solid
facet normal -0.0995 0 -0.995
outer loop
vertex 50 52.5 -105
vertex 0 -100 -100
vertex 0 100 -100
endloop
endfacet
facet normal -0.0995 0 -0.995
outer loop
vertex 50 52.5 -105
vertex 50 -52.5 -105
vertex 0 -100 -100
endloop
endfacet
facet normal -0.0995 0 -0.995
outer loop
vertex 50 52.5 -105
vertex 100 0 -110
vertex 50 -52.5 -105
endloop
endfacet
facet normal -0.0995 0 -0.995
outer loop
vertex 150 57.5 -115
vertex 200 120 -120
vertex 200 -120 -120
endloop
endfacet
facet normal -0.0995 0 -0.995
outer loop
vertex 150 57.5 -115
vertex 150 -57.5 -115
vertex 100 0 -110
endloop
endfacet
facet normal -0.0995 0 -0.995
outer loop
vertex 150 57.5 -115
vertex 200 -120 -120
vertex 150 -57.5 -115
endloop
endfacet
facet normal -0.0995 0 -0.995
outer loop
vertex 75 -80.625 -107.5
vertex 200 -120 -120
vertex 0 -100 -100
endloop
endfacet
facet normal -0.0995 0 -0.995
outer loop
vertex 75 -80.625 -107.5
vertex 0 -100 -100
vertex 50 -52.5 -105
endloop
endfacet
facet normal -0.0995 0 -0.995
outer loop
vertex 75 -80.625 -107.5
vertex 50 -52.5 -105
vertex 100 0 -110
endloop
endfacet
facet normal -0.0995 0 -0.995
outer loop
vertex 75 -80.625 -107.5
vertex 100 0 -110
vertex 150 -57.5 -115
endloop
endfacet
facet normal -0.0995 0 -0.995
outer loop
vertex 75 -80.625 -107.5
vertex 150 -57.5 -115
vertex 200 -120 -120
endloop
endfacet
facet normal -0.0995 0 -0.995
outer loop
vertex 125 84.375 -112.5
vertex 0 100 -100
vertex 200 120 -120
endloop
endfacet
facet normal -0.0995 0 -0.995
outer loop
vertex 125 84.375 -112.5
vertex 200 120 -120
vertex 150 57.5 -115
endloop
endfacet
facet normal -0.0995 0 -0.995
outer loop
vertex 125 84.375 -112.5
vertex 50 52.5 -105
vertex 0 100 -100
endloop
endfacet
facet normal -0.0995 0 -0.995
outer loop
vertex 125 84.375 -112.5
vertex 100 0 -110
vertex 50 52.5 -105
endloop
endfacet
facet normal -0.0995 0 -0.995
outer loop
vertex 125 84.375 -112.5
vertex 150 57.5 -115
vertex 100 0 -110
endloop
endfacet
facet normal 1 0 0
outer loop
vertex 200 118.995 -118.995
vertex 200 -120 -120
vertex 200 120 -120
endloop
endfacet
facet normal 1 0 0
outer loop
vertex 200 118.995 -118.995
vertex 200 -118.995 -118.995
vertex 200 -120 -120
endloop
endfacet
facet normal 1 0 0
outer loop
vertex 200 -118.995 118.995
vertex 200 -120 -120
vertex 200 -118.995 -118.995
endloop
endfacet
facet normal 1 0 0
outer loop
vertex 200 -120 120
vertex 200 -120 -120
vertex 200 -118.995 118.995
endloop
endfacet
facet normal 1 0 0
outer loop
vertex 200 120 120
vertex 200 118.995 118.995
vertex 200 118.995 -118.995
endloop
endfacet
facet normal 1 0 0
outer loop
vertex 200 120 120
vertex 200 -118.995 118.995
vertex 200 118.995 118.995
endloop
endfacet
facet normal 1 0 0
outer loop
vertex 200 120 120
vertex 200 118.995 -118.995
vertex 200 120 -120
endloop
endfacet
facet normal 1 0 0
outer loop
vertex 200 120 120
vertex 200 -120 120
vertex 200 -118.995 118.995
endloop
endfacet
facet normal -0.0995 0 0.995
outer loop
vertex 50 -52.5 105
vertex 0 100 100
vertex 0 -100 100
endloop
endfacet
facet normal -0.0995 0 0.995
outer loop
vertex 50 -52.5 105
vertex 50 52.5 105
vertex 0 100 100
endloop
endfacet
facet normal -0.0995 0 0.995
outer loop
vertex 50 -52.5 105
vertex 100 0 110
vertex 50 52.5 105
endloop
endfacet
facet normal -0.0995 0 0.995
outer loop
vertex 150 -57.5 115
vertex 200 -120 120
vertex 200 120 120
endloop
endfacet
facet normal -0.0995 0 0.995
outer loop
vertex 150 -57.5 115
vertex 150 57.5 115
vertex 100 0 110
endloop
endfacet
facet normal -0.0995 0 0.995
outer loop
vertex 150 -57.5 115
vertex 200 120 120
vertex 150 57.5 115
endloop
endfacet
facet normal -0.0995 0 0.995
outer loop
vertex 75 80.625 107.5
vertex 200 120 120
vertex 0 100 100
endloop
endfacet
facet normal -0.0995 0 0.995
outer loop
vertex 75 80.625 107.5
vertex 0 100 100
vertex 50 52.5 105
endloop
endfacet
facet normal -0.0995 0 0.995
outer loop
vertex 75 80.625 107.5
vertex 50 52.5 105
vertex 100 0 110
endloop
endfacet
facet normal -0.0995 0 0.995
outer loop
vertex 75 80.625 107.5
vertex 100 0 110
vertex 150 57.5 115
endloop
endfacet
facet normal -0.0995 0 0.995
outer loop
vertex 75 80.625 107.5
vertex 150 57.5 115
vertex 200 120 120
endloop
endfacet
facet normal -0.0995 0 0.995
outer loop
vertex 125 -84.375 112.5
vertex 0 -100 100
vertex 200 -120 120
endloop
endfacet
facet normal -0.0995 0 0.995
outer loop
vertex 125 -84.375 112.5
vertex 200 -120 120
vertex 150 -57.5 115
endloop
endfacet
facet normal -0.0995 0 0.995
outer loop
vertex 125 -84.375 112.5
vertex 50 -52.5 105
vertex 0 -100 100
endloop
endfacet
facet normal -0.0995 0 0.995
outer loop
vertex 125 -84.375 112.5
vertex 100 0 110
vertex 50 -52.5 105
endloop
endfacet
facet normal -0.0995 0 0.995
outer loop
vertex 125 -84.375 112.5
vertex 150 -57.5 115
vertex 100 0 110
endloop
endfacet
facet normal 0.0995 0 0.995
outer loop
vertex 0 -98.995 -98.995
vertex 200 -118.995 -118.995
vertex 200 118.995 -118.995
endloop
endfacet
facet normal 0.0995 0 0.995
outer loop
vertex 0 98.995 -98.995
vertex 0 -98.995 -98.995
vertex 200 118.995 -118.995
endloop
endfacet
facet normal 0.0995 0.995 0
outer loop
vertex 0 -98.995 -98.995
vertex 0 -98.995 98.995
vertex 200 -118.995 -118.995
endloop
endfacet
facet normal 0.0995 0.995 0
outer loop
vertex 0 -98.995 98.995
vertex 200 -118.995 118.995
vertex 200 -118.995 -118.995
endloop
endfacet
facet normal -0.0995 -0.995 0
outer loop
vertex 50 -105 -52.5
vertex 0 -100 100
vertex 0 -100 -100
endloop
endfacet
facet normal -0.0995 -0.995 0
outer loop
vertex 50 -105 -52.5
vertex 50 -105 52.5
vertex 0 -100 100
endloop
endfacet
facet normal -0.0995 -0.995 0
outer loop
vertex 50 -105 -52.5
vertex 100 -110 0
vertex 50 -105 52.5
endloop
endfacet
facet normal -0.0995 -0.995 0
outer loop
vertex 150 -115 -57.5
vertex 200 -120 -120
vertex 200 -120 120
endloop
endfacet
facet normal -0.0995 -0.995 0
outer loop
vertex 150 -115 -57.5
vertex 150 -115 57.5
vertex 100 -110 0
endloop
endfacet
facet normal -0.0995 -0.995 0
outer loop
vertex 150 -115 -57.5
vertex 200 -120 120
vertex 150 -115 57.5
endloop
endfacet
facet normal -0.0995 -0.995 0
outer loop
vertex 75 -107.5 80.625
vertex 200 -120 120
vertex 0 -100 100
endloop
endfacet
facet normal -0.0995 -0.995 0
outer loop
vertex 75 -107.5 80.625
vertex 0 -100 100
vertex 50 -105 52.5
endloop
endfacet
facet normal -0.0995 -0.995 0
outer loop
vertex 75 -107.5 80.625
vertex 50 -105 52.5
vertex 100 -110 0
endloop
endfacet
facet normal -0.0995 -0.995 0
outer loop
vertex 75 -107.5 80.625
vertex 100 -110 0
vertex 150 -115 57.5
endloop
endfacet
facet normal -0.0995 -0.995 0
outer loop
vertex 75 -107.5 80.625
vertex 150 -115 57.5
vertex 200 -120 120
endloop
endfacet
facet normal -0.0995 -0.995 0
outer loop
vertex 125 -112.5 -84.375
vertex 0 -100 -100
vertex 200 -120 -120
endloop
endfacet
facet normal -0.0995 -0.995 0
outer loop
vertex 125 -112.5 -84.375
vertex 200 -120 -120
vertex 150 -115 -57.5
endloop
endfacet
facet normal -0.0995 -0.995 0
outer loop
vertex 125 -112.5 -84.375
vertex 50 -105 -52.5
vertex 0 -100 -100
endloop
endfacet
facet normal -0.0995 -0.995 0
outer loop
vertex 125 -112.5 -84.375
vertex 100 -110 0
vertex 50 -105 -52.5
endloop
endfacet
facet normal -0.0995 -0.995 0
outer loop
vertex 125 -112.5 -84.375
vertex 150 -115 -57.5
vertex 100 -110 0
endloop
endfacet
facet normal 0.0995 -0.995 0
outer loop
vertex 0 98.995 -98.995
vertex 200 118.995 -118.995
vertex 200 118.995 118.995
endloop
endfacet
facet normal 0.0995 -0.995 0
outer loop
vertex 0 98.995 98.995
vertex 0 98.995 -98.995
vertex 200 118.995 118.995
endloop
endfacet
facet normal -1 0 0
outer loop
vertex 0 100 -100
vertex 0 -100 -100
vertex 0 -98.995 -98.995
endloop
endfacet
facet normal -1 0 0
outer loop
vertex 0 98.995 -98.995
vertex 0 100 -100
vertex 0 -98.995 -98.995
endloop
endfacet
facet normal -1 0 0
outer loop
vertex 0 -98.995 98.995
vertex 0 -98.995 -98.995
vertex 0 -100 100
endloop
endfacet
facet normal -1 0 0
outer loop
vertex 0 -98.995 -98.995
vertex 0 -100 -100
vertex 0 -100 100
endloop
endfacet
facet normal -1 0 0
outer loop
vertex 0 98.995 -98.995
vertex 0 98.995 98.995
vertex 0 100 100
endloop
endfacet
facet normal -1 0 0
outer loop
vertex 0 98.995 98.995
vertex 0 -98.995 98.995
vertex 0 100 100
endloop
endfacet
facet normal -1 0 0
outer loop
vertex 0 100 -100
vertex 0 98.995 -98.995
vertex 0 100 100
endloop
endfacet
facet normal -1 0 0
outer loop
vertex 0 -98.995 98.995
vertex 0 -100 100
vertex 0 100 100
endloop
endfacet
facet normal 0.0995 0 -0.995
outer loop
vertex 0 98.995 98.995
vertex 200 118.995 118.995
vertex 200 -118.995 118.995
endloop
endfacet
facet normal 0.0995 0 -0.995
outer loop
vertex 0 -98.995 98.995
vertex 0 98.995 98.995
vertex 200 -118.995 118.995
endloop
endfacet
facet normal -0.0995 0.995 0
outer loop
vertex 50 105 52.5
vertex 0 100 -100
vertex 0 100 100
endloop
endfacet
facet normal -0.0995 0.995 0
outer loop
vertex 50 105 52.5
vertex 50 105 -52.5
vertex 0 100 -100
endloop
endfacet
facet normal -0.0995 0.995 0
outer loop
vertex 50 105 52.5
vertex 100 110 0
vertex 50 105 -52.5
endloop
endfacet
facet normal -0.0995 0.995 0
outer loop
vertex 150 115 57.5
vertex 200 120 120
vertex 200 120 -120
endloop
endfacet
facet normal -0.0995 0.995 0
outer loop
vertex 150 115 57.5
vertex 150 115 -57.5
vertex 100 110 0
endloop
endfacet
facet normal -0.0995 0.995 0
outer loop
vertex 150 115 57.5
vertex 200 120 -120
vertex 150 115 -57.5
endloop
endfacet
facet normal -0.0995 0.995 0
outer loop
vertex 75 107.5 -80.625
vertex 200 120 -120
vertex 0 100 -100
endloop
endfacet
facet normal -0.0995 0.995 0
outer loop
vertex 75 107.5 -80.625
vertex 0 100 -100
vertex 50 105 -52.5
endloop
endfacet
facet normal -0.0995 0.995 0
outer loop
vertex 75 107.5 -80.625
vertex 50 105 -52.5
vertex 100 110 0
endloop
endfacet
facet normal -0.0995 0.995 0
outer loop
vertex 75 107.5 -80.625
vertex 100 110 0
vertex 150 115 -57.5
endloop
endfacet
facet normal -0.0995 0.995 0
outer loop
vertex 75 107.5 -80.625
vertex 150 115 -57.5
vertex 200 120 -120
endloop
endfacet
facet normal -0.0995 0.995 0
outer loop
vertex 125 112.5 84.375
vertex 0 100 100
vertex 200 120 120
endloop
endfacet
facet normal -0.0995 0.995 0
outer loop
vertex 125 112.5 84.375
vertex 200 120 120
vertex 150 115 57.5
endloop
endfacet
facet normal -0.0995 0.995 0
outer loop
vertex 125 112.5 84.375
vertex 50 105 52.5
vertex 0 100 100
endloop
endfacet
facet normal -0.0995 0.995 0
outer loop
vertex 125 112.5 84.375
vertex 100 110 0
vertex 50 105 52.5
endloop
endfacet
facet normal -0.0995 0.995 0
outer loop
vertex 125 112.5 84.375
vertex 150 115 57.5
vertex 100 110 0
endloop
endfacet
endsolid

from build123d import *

# Parameters (mm, degrees)
F0_W = 200
F0_H = 200
F2_W = 240
F2_H = 240
F4_T = -1


with BuildPart() as f3:
    # F0 (on Right) → F3 section 0
    with BuildSketch(Plane.YZ):
        Rectangle(F0_W, F0_H)
    # F2 (on offset) → F3 section 1
    with BuildSketch(Plane.YZ.offset(200)):
        Rectangle(F2_W, F2_H)
    loft()

    # F4
    f4_openings = [f3.faces().sort_by_distance(p)[0] for p in [
        (200, 0, 0),
        (0, 0, 0),
    ]]
    offset(amount=F4_T, openings=f4_openings, kind=Kind.INTERSECTION)


solid = f3.part
